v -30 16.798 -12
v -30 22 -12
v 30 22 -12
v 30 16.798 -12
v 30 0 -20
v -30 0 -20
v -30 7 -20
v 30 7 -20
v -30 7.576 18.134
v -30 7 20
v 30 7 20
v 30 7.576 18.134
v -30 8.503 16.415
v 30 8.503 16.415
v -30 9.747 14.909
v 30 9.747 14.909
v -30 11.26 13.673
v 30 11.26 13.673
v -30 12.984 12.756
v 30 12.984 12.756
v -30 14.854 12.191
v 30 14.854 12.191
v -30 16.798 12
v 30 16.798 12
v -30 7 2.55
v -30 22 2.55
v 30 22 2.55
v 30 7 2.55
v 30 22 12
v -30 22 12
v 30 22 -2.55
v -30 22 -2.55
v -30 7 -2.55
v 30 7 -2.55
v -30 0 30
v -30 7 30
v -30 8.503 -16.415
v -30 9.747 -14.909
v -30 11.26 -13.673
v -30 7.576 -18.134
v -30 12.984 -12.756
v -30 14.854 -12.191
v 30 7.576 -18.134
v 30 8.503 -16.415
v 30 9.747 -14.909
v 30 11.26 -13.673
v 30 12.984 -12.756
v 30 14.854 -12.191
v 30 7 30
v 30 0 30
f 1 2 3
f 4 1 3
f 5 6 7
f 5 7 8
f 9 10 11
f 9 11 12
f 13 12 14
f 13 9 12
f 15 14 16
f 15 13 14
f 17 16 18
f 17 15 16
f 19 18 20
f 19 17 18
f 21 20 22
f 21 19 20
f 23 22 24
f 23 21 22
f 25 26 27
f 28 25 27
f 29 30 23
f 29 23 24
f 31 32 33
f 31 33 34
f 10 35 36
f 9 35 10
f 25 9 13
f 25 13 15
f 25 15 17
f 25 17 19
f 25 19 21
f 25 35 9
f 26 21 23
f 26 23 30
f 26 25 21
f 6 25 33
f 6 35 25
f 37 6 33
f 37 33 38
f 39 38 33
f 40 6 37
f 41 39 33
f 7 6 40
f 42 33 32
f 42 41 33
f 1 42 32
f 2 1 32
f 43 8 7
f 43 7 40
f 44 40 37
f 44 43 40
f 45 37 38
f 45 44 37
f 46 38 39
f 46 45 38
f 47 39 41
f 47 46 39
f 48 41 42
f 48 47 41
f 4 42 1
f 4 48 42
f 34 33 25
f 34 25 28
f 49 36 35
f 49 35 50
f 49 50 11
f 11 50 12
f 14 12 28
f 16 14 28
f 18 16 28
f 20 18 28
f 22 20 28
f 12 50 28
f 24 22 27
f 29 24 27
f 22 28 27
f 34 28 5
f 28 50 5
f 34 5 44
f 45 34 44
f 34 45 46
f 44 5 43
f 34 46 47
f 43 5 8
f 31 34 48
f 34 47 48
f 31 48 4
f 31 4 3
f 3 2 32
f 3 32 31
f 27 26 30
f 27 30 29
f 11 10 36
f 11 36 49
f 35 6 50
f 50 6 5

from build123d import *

# Parameters (mm, degrees)
SKETCH1_W           = 60
SKETCH1_H           = 40
BOSS_EXTRUDE1_DEPTH = 22
SKETCH2_W           = 60
SKETCH2_H           = 5.1
SKETCH2_H_2         = 8
CUT_EXTRUDE1_DEPTH  = 15
FILLET1_R           = 10
SKETCH3_W           = 60
SKETCH3_H           = 7
BOSS_EXTRUDE2_DEPTH = 10


with BuildPart() as part:
    # Sketch1 → Boss-Extrude1 (new body)
    with BuildSketch(Plane(origin=(0, 0, 0), x_dir=(1, 0, 0), z_dir=(0, 1, 0))):
        Rectangle(SKETCH1_W, SKETCH1_H)
    extrude(amount=BOSS_EXTRUDE1_DEPTH)

    # Sketch2 → Cut-Extrude1 (cut)
    with BuildSketch(Plane(origin=(0, 22, 0), x_dir=(1, 0, 0), z_dir=(0, 1, 0))):
        Rectangle(SKETCH2_W, SKETCH2_H)
        with Locations((0, 16)):
            Rectangle(SKETCH2_W, SKETCH2_H_2)
        with Locations((0, -16)):
            Rectangle(SKETCH2_W, SKETCH2_H_2)
    extrude(amount=-CUT_EXTRUDE1_DEPTH, mode=Mode.SUBTRACT)

    # Fillet1
    # the kernel refuses this fillet: 10 mm, written as the material it adds along each edge
    with BuildSketch(Plane(origin=(-30, 7, 12), x_dir=(0, 0, 1), z_dir=(1, 0, 0)), Plane(origin=(30, 7, -12), x_dir=(0, 0, -1), z_dir=(-1, 0, 0))) as fillet1_piece_1:
        with BuildLine():
            CenterArc((10, -9.797958971), FILLET1_R, 101.536959033, 78.463040967)
            Line((0, -9.797958971), (-0.2, -9.797958971))
            Line((-0.2, -9.797958971), (-0.2, 0))
            Line((-0.2, 0), (0, 0.2))
            ThreePointArc((0, 0.2), (4, 0.2), (7.96, 0.195959179))
            Line((7.96, 0.195959179), (8, 0))
        make_face()
    extrude(amount=60)

    # Sketch3 → Boss-Extrude2 (add)
    with BuildSketch(Plane.XY.offset(20)):
        with Locations((0, 3.5)):
            Rectangle(SKETCH3_W, SKETCH3_H)
    extrude(amount=BOSS_EXTRUDE2_DEPTH)


solid = part.part
